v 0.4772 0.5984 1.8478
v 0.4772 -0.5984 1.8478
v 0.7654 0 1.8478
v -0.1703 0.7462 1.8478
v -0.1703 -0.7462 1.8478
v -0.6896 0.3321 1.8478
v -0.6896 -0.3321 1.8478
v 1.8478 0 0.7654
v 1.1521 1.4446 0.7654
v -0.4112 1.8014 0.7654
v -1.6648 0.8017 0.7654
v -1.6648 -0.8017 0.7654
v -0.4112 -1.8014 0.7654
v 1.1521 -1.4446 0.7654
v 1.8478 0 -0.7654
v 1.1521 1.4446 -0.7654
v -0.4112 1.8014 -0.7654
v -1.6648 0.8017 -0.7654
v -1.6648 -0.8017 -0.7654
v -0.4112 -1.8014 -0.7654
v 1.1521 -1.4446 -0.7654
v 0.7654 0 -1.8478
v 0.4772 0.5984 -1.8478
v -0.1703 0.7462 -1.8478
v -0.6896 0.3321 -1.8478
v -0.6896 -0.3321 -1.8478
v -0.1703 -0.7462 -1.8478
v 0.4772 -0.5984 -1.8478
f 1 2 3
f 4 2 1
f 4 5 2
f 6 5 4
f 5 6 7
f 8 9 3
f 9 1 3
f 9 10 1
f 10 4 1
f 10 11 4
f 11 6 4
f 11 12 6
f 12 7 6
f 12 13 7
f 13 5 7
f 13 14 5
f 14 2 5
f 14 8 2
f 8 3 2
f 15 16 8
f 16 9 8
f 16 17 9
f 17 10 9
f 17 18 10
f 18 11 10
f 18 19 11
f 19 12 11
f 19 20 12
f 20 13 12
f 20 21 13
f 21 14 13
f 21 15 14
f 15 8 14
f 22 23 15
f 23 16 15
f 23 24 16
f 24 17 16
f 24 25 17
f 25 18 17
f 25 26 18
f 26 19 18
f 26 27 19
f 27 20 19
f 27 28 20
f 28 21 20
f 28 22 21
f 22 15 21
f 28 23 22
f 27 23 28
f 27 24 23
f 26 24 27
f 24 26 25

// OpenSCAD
/* [Hidden] */

// onescad: main.scad

a = 5;

echo(a);

b = a + 1;

echo(b, a);

module m() { sphere(2); }

function f() = 2;

m();

echo(f());
